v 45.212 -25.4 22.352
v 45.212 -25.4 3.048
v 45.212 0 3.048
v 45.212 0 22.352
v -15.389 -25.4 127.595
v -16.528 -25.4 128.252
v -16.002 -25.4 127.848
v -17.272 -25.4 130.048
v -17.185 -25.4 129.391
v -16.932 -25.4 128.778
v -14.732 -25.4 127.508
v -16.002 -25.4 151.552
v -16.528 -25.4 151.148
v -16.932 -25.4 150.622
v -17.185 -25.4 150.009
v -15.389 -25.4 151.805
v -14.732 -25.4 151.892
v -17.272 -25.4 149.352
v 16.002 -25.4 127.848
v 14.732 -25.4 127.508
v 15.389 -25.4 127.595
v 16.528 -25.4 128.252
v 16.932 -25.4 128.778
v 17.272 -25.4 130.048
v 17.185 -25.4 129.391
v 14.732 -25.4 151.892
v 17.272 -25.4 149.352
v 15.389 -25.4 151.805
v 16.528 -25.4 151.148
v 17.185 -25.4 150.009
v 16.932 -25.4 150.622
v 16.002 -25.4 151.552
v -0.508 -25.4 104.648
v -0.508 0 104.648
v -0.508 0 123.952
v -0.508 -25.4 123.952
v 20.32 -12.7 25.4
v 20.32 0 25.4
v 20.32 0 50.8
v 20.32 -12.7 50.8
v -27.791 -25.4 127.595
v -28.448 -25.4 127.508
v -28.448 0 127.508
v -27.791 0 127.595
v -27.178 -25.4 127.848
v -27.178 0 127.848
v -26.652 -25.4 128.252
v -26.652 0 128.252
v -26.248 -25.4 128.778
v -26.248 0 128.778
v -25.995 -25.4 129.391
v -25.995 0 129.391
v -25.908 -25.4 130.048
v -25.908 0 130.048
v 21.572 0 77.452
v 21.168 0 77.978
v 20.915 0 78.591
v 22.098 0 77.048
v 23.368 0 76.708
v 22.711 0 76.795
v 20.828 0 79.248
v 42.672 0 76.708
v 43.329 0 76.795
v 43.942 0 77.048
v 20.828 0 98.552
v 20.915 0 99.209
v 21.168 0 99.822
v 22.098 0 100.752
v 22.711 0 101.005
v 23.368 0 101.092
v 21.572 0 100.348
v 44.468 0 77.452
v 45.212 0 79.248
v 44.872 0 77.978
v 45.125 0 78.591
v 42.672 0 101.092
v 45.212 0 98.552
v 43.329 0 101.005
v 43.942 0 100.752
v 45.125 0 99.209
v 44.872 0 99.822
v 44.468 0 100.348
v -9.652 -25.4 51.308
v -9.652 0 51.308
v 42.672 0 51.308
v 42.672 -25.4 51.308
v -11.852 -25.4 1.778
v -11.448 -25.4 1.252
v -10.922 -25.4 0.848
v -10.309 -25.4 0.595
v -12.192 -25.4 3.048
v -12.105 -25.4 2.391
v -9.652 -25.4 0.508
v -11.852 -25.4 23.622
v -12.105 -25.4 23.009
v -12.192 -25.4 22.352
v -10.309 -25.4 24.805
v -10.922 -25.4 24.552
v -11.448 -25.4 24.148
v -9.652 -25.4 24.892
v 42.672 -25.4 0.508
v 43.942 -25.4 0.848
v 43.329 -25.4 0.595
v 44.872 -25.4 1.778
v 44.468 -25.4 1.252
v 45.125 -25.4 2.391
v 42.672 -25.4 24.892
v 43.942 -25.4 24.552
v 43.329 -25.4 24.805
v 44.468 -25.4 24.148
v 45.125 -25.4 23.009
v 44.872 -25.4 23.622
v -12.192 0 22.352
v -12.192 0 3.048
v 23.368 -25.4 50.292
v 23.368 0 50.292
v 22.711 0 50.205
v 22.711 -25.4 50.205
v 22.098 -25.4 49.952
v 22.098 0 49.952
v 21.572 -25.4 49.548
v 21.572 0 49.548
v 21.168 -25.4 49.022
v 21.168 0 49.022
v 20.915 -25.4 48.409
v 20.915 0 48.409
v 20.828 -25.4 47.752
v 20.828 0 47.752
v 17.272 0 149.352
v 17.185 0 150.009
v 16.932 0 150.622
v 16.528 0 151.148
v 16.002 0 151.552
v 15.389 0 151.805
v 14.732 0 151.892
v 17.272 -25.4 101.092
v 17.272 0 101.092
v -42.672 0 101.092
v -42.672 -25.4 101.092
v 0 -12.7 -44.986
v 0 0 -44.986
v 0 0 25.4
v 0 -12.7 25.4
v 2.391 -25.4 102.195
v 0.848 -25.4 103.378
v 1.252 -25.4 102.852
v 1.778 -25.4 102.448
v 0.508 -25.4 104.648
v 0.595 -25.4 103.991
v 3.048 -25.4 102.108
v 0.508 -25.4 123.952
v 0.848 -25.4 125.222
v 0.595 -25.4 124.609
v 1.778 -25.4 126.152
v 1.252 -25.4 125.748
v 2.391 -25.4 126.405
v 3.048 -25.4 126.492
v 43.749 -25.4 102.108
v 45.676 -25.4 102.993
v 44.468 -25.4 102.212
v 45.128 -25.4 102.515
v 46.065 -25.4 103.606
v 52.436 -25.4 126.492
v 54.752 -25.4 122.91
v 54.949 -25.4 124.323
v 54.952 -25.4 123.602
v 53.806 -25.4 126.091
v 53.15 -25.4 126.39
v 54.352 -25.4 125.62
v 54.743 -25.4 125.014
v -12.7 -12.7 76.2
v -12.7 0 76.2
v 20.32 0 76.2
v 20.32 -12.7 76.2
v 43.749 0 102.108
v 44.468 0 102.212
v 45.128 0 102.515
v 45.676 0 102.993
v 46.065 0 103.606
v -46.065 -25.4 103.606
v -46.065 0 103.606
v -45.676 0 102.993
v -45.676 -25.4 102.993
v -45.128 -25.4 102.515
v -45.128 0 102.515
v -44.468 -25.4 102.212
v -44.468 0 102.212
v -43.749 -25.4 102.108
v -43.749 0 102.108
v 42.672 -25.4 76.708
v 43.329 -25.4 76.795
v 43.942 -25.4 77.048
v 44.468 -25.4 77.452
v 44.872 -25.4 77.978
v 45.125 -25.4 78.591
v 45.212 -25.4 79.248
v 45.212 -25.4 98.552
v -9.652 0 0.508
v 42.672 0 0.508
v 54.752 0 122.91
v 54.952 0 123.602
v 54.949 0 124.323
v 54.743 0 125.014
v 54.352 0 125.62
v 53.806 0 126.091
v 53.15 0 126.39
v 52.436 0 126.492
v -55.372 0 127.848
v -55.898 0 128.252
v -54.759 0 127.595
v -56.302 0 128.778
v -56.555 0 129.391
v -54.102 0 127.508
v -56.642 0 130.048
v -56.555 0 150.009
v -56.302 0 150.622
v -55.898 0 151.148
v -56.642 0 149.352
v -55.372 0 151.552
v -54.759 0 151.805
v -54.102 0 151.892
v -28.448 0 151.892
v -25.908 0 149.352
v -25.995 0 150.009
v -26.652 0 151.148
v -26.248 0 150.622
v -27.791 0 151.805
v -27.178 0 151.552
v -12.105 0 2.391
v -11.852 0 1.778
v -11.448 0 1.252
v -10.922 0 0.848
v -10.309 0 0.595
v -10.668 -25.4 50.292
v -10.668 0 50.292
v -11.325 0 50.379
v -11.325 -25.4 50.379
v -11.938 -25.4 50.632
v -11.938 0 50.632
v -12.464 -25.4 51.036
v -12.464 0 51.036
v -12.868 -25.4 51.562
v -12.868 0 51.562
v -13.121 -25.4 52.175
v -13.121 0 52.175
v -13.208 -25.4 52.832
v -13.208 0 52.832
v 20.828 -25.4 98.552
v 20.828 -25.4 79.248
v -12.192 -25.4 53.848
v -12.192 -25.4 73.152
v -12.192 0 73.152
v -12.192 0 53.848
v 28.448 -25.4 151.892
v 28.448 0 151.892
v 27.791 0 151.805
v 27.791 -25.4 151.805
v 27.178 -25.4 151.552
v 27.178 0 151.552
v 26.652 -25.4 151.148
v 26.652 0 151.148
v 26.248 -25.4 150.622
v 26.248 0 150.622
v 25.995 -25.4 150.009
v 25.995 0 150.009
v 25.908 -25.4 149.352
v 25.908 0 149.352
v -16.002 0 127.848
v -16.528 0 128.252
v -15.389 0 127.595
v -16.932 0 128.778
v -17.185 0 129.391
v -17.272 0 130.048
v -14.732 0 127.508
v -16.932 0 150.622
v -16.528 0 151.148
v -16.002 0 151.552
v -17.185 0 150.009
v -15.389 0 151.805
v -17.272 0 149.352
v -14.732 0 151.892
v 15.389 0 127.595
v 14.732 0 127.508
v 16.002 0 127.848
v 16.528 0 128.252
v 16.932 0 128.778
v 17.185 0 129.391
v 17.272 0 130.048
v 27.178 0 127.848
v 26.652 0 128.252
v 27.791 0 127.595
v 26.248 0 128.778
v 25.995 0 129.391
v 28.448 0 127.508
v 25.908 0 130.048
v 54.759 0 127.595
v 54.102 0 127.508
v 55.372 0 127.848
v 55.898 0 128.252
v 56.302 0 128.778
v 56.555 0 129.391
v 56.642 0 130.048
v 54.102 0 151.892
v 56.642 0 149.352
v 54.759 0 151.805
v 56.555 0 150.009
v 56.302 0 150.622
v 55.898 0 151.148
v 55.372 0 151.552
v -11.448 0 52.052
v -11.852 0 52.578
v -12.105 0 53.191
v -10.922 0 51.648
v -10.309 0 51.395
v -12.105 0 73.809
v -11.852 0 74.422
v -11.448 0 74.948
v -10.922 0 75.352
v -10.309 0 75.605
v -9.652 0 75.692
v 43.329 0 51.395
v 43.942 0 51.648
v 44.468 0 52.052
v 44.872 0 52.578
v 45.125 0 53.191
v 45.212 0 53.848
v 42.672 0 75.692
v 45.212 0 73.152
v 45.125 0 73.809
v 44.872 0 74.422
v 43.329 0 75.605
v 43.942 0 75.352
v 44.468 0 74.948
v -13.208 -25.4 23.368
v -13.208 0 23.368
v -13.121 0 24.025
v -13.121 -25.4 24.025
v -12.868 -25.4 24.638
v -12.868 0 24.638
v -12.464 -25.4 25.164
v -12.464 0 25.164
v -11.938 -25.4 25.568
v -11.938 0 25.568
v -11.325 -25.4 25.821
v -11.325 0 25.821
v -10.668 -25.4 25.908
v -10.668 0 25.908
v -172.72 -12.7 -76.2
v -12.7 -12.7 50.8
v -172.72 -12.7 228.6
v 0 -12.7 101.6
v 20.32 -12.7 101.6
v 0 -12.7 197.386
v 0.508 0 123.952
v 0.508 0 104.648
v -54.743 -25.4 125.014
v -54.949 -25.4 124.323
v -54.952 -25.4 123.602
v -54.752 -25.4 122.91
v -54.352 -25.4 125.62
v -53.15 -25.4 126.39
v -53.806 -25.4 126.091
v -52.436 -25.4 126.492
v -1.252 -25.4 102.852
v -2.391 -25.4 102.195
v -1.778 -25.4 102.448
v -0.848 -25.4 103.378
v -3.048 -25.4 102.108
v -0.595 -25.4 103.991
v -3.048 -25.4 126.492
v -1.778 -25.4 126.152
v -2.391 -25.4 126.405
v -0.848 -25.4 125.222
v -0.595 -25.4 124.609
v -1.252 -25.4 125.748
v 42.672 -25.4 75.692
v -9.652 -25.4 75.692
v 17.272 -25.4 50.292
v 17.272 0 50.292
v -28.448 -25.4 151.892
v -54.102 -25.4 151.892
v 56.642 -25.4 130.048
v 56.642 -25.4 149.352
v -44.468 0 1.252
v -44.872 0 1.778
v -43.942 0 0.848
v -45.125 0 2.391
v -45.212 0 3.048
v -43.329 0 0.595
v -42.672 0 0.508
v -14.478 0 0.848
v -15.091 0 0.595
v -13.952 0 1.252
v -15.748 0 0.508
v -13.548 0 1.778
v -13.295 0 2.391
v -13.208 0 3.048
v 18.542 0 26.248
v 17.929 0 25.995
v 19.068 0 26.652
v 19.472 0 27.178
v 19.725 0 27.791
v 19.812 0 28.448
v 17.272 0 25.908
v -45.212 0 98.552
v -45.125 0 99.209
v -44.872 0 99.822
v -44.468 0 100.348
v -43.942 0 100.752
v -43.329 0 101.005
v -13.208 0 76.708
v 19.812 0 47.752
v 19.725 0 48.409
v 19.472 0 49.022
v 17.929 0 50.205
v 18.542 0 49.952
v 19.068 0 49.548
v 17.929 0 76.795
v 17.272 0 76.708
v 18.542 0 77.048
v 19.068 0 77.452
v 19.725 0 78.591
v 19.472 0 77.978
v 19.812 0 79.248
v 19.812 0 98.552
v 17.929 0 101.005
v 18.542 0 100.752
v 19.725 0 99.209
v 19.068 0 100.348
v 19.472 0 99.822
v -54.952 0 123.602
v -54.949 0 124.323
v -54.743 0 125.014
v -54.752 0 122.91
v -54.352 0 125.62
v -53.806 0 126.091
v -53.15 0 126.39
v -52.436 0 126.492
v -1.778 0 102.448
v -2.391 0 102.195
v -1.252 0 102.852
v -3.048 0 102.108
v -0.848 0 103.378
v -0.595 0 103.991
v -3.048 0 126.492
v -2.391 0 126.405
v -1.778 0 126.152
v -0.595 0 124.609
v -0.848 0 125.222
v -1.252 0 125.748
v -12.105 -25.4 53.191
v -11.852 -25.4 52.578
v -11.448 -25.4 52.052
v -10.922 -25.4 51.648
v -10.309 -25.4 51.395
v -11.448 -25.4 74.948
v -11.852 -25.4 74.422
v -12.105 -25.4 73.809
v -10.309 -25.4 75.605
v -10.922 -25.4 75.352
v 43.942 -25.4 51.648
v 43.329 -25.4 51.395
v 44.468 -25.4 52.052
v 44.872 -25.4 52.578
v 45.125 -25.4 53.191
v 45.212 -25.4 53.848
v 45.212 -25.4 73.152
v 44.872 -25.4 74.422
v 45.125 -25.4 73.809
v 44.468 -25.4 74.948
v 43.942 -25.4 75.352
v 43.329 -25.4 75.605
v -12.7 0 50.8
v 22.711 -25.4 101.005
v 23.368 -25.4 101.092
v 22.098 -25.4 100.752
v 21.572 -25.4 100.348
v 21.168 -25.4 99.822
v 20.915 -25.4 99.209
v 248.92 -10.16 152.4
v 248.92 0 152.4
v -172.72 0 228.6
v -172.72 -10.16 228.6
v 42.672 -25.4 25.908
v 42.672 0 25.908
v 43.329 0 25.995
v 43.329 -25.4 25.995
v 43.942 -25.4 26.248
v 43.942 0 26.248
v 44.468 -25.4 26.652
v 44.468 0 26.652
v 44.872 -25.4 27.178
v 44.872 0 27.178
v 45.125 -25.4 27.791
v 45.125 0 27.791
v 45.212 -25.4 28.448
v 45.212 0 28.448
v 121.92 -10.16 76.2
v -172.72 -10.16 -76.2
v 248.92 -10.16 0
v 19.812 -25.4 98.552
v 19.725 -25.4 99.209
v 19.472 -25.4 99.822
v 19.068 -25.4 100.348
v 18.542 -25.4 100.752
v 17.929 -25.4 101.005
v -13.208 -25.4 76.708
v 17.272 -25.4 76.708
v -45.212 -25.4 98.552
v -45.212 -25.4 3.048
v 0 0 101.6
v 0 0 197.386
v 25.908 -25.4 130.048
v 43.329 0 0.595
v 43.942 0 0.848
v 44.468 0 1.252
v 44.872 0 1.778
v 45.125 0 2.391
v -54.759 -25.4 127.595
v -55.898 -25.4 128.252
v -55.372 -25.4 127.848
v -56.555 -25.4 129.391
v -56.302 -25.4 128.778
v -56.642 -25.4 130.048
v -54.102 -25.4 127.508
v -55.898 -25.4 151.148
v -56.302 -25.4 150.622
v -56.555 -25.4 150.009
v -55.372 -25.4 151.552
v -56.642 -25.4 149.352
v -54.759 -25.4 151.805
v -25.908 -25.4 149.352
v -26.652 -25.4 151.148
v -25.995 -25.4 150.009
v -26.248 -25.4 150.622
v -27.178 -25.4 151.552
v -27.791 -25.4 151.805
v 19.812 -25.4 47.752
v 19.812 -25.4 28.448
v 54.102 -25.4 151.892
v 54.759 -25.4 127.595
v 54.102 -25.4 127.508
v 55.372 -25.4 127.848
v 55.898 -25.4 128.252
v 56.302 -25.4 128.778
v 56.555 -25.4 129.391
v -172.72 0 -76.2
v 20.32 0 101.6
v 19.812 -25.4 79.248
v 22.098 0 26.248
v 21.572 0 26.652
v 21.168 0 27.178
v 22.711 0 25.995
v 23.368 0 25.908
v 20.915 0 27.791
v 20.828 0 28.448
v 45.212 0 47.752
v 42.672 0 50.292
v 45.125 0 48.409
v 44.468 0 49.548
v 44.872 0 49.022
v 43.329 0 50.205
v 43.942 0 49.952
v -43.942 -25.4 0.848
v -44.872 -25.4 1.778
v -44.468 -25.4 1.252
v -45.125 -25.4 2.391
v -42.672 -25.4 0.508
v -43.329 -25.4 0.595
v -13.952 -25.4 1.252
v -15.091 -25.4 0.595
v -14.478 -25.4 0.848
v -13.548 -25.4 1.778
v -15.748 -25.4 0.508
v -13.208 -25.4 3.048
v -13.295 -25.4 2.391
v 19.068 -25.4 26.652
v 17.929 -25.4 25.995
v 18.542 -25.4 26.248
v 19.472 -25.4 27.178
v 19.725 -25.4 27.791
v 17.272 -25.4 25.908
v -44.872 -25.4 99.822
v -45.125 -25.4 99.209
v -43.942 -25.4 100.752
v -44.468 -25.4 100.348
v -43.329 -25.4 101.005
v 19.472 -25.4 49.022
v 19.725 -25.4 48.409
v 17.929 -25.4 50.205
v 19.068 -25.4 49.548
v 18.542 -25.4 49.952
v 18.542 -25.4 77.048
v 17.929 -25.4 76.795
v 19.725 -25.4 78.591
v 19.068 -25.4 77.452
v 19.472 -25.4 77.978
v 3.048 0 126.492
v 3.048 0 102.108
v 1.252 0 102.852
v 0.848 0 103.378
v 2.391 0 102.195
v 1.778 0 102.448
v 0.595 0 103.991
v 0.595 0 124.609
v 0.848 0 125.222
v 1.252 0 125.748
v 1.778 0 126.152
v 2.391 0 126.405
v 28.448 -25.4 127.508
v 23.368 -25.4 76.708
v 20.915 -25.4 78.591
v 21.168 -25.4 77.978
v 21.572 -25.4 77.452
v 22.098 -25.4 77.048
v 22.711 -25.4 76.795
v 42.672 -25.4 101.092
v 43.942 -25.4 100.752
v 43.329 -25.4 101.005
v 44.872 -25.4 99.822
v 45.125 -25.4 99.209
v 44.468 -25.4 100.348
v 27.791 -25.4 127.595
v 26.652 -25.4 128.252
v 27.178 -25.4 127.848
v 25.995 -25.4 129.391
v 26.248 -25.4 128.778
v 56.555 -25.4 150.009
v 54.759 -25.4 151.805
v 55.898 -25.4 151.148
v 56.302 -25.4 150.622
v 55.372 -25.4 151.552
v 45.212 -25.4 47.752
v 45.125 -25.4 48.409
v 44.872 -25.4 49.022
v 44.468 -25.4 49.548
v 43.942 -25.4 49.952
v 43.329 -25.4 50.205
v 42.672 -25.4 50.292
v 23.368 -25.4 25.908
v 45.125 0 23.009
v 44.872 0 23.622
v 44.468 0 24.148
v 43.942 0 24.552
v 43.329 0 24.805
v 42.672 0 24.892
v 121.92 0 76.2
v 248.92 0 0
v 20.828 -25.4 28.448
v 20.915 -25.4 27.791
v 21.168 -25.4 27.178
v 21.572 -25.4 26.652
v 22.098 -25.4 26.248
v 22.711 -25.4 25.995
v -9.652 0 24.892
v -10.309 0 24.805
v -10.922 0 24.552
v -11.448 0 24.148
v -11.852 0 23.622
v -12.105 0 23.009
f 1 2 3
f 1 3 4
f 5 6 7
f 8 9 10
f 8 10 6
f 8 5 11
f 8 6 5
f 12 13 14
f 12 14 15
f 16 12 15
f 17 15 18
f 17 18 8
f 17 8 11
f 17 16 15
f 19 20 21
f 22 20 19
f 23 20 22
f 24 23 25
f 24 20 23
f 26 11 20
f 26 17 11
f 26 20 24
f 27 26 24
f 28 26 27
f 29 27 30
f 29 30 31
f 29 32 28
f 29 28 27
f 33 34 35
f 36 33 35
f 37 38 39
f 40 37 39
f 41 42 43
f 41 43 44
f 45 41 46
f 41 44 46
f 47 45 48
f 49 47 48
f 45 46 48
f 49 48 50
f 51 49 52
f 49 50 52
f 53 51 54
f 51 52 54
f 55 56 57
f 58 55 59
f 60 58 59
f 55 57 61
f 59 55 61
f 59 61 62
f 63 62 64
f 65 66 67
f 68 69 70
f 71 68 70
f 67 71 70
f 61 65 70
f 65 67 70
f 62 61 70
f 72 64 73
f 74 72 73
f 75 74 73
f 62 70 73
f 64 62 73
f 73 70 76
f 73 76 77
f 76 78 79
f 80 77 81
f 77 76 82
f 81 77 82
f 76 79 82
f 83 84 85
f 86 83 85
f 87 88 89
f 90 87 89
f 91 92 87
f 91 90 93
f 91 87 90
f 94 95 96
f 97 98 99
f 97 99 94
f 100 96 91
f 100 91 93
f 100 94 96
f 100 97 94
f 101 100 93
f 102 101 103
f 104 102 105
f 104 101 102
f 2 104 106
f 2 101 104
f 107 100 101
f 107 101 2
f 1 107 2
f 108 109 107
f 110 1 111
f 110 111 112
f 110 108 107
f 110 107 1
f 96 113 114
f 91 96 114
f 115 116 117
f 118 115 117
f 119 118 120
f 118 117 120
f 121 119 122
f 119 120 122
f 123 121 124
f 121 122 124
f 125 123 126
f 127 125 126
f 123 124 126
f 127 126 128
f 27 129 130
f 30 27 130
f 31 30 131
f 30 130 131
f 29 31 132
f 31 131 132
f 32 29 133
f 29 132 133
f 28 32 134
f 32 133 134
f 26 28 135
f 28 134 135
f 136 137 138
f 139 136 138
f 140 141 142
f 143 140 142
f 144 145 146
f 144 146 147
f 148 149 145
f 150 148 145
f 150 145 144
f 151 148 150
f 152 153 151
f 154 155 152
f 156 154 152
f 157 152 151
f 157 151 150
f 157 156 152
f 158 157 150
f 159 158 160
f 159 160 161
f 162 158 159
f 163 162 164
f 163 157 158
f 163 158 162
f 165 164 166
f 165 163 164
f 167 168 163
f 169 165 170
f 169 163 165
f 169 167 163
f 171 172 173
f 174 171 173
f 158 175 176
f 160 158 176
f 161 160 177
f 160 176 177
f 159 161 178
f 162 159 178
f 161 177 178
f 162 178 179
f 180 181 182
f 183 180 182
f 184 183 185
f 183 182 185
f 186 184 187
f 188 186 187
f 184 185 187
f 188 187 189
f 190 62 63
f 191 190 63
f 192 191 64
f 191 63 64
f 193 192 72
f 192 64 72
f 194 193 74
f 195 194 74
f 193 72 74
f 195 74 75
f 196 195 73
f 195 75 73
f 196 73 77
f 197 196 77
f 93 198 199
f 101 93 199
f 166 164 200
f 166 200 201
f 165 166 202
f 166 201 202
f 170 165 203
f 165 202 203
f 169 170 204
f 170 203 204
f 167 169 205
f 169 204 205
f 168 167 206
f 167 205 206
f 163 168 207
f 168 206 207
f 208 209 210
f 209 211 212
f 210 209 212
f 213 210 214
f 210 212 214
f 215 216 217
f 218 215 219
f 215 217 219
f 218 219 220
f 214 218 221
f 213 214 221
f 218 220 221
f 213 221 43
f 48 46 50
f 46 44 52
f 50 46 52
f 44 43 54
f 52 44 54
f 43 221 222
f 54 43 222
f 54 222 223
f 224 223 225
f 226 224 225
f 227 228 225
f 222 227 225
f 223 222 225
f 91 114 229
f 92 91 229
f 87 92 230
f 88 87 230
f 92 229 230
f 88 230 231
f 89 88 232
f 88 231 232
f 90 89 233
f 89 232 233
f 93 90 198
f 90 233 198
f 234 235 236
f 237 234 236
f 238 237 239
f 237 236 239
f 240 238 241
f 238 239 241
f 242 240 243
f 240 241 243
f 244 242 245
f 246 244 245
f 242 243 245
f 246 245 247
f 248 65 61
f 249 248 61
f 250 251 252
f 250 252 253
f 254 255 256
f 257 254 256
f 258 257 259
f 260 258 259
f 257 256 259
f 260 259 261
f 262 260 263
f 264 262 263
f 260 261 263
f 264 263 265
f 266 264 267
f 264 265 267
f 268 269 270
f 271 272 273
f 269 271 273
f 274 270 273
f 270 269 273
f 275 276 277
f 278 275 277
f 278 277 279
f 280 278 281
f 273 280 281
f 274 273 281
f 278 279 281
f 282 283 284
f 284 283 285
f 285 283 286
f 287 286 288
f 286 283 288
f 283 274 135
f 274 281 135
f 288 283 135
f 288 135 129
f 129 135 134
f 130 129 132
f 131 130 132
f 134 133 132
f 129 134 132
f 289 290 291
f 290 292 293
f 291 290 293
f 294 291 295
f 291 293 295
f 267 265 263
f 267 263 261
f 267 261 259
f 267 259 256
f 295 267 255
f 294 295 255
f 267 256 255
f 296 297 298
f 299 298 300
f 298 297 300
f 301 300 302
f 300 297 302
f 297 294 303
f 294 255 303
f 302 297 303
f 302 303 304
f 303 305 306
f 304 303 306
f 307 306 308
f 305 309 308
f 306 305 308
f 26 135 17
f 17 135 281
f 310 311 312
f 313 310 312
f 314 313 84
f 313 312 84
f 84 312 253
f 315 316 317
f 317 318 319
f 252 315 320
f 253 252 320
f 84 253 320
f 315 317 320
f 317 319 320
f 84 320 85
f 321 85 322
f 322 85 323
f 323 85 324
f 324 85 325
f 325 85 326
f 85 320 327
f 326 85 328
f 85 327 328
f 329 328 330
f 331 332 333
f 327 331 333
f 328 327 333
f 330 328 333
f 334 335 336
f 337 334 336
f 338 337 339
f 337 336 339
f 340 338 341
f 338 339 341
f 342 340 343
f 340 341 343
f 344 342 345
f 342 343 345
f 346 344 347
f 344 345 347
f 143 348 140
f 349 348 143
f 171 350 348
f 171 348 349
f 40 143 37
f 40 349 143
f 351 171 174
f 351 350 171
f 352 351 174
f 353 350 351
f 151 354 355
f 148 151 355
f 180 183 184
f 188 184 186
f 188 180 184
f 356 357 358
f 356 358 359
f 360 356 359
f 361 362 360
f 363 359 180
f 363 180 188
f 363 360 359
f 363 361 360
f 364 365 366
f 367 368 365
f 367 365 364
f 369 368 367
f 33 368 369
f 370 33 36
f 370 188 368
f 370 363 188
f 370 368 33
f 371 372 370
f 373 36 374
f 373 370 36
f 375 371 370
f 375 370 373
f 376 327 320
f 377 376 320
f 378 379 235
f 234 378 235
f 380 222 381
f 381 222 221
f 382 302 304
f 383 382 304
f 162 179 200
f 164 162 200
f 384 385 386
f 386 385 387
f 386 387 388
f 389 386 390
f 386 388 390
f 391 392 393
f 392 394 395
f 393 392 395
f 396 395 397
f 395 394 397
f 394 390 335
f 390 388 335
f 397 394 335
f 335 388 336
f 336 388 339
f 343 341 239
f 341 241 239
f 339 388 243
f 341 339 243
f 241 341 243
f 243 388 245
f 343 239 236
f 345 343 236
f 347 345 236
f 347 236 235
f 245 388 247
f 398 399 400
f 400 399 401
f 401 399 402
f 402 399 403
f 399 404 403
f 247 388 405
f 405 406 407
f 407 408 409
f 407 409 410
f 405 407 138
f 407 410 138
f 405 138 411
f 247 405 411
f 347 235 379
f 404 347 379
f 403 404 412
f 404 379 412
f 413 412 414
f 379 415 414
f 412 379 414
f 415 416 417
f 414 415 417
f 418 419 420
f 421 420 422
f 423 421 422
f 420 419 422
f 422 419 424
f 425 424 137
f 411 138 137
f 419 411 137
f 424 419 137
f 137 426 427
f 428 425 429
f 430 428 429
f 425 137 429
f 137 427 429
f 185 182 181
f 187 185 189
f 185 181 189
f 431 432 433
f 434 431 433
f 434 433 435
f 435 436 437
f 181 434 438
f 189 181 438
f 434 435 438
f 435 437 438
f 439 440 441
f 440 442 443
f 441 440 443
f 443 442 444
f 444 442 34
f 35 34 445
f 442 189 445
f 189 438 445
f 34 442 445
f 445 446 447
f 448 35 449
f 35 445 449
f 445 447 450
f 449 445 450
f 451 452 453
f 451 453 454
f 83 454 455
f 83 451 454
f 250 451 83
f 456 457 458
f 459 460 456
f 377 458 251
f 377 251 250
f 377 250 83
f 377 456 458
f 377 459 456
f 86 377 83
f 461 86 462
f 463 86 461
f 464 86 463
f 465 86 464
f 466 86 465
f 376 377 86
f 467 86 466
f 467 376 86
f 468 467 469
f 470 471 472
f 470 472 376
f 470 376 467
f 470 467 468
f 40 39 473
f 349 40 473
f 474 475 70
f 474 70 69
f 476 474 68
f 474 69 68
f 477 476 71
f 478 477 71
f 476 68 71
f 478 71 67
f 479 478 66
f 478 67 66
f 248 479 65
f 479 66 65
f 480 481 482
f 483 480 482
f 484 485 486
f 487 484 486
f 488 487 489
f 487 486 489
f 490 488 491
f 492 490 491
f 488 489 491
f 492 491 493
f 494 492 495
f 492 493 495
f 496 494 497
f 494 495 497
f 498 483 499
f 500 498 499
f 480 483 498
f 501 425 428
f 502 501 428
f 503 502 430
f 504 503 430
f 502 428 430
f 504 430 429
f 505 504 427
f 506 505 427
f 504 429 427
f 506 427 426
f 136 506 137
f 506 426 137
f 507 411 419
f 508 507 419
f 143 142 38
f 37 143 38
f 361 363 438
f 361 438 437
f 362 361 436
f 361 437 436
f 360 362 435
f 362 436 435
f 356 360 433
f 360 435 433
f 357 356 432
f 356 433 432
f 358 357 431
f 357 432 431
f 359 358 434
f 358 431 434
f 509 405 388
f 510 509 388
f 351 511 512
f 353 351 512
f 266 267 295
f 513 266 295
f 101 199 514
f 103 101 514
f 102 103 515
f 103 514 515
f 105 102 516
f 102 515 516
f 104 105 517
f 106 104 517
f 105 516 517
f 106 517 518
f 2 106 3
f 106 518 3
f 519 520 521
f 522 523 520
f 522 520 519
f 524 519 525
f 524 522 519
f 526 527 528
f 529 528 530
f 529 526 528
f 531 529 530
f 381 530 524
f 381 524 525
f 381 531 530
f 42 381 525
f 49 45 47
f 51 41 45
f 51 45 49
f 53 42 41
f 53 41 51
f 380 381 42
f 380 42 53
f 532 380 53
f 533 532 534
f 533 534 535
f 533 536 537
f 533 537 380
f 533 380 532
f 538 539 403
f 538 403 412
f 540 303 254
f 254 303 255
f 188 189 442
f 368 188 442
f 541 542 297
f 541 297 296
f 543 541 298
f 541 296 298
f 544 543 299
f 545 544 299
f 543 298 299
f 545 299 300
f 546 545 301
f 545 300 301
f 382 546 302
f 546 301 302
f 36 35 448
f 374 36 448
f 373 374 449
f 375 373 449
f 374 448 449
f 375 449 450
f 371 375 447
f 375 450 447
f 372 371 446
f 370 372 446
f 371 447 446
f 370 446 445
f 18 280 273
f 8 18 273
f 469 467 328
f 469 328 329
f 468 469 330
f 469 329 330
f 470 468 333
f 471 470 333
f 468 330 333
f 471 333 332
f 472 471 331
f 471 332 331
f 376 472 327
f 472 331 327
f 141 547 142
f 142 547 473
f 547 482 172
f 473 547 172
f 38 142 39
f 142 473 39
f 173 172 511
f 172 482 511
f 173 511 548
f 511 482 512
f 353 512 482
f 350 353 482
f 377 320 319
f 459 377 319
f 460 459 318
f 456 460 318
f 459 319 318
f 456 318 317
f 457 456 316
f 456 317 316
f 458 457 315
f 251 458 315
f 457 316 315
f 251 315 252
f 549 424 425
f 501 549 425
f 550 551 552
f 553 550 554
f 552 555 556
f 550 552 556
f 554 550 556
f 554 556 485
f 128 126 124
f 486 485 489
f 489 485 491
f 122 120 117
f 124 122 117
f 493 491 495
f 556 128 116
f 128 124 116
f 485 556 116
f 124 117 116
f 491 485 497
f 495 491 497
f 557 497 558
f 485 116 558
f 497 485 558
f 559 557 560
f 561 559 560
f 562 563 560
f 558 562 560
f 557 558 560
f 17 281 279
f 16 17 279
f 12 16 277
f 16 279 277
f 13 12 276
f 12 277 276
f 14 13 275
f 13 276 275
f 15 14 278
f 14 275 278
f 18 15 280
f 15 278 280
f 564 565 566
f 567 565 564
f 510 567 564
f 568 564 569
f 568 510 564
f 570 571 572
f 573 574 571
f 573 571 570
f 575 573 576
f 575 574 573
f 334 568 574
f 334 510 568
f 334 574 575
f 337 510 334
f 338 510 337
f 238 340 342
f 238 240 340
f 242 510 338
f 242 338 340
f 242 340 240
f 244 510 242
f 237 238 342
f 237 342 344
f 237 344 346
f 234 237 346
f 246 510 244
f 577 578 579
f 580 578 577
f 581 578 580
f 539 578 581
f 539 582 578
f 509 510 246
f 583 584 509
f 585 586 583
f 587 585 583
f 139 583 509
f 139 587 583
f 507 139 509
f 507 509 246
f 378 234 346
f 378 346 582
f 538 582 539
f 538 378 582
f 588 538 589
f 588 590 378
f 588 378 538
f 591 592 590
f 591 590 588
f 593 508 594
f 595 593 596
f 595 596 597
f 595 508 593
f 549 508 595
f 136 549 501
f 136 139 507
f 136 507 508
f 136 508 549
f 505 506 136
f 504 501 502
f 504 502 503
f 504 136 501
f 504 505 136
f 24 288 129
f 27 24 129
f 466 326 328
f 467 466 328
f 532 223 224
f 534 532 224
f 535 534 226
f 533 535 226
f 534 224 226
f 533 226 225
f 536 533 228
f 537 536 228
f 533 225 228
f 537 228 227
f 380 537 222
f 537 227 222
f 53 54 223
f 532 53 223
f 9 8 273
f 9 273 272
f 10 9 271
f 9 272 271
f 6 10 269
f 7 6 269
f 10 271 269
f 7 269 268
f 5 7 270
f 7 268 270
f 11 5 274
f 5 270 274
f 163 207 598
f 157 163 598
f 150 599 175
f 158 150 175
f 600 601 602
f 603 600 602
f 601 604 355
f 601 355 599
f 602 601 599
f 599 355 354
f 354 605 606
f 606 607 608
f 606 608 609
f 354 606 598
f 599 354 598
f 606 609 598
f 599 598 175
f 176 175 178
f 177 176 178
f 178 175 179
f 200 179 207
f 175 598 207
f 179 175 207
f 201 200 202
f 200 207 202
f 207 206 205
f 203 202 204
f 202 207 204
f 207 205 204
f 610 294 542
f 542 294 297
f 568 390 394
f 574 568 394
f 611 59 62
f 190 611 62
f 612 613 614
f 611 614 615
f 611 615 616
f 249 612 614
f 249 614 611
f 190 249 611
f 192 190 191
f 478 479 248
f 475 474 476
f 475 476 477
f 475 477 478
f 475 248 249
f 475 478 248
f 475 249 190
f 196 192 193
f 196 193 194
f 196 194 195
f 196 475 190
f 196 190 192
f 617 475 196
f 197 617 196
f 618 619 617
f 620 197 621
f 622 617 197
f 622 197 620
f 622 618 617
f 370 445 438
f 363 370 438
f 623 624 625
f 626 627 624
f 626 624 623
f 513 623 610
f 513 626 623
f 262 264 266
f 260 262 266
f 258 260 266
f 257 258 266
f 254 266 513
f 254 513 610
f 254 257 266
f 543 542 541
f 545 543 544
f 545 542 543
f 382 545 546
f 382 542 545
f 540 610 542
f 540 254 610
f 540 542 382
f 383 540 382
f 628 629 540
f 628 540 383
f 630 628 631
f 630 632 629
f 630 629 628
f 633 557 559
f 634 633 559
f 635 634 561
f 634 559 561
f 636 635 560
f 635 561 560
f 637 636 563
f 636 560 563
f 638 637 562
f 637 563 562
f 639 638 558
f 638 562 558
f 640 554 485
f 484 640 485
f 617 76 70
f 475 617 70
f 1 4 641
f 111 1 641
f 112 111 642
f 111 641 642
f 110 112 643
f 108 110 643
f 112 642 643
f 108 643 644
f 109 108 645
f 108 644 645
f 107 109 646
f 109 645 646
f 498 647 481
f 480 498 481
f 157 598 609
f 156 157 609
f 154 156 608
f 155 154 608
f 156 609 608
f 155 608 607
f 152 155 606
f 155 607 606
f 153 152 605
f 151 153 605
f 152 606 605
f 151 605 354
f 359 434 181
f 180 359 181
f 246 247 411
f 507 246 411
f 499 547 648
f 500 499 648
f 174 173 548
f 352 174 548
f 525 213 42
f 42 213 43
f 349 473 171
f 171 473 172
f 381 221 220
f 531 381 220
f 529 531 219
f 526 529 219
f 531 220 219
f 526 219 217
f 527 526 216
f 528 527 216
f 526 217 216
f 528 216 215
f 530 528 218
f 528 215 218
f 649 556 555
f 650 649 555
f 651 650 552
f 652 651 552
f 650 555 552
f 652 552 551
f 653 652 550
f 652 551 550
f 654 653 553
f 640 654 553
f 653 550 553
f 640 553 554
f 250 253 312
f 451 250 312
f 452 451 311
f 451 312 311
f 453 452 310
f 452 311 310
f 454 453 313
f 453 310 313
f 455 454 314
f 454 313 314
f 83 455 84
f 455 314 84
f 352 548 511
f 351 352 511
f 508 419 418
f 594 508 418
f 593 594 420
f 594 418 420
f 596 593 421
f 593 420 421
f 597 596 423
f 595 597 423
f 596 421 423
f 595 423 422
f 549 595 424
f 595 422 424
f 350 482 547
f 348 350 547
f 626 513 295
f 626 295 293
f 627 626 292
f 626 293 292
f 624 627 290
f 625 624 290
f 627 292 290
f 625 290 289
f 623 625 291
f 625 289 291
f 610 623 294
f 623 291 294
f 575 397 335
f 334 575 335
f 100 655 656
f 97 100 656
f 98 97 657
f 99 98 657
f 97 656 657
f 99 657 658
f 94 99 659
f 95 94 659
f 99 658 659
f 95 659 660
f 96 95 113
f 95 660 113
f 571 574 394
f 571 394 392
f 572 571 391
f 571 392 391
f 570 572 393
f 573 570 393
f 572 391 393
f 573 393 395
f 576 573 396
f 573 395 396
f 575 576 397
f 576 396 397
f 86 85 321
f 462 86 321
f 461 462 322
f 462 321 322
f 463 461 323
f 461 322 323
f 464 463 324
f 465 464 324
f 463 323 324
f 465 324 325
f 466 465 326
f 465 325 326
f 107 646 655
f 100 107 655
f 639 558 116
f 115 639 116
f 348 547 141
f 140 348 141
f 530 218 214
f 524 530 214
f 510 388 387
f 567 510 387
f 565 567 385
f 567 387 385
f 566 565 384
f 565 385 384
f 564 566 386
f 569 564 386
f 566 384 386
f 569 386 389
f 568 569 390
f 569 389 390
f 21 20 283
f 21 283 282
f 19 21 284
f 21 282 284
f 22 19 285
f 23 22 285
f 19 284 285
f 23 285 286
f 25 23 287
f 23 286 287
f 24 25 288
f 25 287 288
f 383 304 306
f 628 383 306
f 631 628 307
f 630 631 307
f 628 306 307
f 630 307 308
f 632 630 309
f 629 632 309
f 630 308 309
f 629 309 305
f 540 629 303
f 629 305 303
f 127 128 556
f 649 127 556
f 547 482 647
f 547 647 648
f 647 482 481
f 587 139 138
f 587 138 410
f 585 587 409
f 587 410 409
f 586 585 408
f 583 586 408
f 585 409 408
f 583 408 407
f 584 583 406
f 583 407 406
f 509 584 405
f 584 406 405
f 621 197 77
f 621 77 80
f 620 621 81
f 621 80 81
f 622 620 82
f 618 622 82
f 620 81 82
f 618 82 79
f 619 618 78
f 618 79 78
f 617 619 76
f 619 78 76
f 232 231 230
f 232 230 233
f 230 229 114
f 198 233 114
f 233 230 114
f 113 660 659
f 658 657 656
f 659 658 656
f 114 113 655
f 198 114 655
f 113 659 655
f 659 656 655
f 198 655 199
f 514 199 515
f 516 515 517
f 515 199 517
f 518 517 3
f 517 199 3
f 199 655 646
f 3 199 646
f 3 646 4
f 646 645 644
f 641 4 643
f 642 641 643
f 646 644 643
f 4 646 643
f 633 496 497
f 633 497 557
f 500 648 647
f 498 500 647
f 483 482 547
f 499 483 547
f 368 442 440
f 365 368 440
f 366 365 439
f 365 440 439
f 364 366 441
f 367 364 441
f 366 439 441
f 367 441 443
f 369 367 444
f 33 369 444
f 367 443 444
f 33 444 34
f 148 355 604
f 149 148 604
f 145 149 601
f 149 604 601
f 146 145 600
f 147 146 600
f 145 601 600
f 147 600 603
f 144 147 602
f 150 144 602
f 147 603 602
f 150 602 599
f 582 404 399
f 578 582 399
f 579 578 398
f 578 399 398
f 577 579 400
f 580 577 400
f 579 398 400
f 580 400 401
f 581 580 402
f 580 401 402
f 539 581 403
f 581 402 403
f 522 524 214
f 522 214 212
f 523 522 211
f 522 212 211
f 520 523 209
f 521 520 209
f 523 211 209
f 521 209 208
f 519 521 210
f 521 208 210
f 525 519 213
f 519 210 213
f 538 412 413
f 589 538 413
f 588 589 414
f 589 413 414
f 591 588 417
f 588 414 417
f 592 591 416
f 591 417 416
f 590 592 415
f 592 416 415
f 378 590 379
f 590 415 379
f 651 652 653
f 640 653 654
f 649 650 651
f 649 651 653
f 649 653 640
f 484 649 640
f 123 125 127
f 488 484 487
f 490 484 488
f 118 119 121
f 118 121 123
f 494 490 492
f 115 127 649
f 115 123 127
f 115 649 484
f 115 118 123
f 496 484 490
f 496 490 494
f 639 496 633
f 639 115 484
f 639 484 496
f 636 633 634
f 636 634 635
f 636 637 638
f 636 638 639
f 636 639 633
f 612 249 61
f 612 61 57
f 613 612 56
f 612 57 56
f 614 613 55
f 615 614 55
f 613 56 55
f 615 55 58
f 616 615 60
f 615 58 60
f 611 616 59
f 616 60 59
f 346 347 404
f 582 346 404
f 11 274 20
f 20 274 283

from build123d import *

# Parameters (mm, degrees)
F2_DEPTH = 25.4
F5_DEPTH = 12.7
F6_DEPTH = 10.16


with BuildPart() as f2:
    # F1 (on face) → F2 (new body)
    with BuildSketch(Plane.XZ):
        with BuildLine():
            ThreePointArc((17.272, 76.708), (19.068051, 77.451949), (19.812, 79.248))
            Line((19.812, 79.248), (19.812, 98.552))
            ThreePointArc((19.812, 98.552), (19.068051, 100.348051), (17.272, 101.092))
            Line((17.272, 101.092), (0, 101.092))
            Line((0, 101.092), (-42.672, 101.092))
            ThreePointArc((-42.672, 101.092), (-44.468051, 100.348051), (-45.212, 98.552))
            Line((-45.212, 98.552), (-45.212, 76.2))
            Line((-45.212, 76.2), (-45.212, 50.8))
            Line((-45.212, 50.8), (-45.212, 25.4))
            Line((-45.212, 25.4), (-45.212, 3.048))
            ThreePointArc((-45.212, 3.048), (-44.468051, 1.251949), (-42.672, 0.508))
            Line((-42.672, 0.508), (-15.748, 0.508))
            ThreePointArc((-15.748, 0.508), (-13.951949, 1.251949), (-13.208, 3.048))
            Line((-13.208, 3.048), (-13.208, 23.368))
            ThreePointArc((-13.208, 23.368), (-12.464051, 25.164051), (-10.668, 25.908))
            Line((-10.668, 25.908), (17.272, 25.908))
            ThreePointArc((17.272, 25.908), (19.068051, 26.651949), (19.812, 28.448))
            Line((19.812, 28.448), (19.812, 47.752))
            ThreePointArc((19.812, 47.752), (19.068051, 49.548051), (17.272, 50.292))
            Line((17.272, 50.292), (-10.668, 50.292))
            ThreePointArc((-10.668, 50.292), (-12.464051, 51.035949), (-13.208, 52.832))
            Line((-13.208, 52.832), (-13.208, 76.708))
            Line((-13.208, 76.708), (17.272, 76.708))
        make_face()
        with BuildLine():
            Line((42.672, 24.892), (15.24, 24.892))
            Line((15.24, 24.892), (-9.652, 24.892))
            ThreePointArc((-9.652, 24.892), (-11.448051, 24.148051), (-12.192, 22.352))
            Line((-12.192, 22.352), (-12.192, 3.048))
            ThreePointArc((-12.192, 3.048), (-11.448051, 1.251949), (-9.652, 0.508))
            Line((-9.652, 0.508), (42.672, 0.508))
            ThreePointArc((42.672, 0.508), (44.468051, 1.251949), (45.212, 3.048))
            Line((45.212, 3.048), (45.212, 22.352))
            ThreePointArc((45.212, 22.352), (44.468051, 24.148051), (42.672, 24.892))
        make_face()
        with BuildLine():
            ThreePointArc((45.212, 47.752), (44.468051, 49.548051), (42.672, 50.292))
            Line((42.672, 50.292), (23.368, 50.292))
            ThreePointArc((23.368, 50.292), (21.571949, 49.548051), (20.828, 47.752))
            Line((20.828, 47.752), (20.828, 28.448))
            ThreePointArc((20.828, 28.448), (21.571949, 26.651949), (23.368, 25.908))
            Line((23.368, 25.908), (42.672, 25.908))
            ThreePointArc((42.672, 25.908), (44.468051, 26.651949), (45.212, 28.448))
            Line((45.212, 28.448), (45.212, 47.752))
        make_face()
        with BuildLine():
            ThreePointArc((42.672, 51.308), (44.468051, 52.051949), (45.212, 53.848))
            Line((45.212, 53.848), (45.212, 73.152))
            ThreePointArc((45.212, 73.152), (44.468051, 74.948051), (42.672, 75.692))
            Line((42.672, 75.692), (25.4, 75.692))
            Line((25.4, 75.692), (-9.652, 75.692))
            ThreePointArc((-9.652, 75.692), (-11.448051, 74.948051), (-12.192, 73.152))
            Line((-12.192, 73.152), (-12.192, 53.848))
            ThreePointArc((-12.192, 53.848), (-11.448051, 52.051949), (-9.652, 51.308))
            Line((-9.652, 51.308), (15.24, 51.308))
            Line((15.24, 51.308), (42.672, 51.308))
        make_face()
        with BuildLine():
            ThreePointArc((45.212, 98.552), (44.468051, 100.348051), (42.672, 101.092))
            Line((42.672, 101.092), (23.368, 101.092))
            ThreePointArc((23.368, 101.092), (21.571949, 100.348051), (20.828, 98.552))
            Line((20.828, 98.552), (20.828, 79.248))
            ThreePointArc((20.828, 79.248), (21.571949, 77.451949), (23.368, 76.708))
            Line((23.368, 76.708), (42.672, 76.708))
            ThreePointArc((42.672, 76.708), (44.468051, 77.451949), (45.212, 79.248))
            Line((45.212, 79.248), (45.212, 98.552))
        make_face()
        with BuildLine():
            ThreePointArc((43.749207, 102.108), (45.128354, 102.515032), (46.065488, 103.605674))
            Line((46.065488, 103.605674), (54.752288, 122.909674))
            ThreePointArc((54.752288, 122.909674), (54.568976, 125.331147), (52.436007, 126.492))
            Line((52.436007, 126.492), (25.4, 126.492))
            Line((25.4, 126.492), (15.24, 126.492))
            Line((15.24, 126.492), (3.048, 126.492))
            ThreePointArc((3.048, 126.492), (1.251949, 125.748051), (0.508, 123.952))
            Line((0.508, 123.952), (0.508, 104.648))
            ThreePointArc((0.508, 104.648), (1.251949, 102.851949), (3.048, 102.108))
            Line((3.048, 102.108), (25.4, 102.108))
            Line((25.4, 102.108), (43.749207, 102.108))
        make_face()
        with BuildLine():
            ThreePointArc((-3.048, 102.108), (-1.251949, 102.851949), (-0.508, 104.648))
            Line((-0.508, 104.648), (-0.508, 123.952))
            ThreePointArc((-0.508, 123.952), (-1.251949, 125.748051), (-3.048, 126.492))
            Line((-3.048, 126.492), (-15.24, 126.492))
            Line((-15.24, 126.492), (-25.4, 126.492))
            Line((-25.4, 126.492), (-52.436007, 126.492))
            ThreePointArc((-52.436007, 126.492), (-54.568976, 125.331147), (-54.752288, 122.909674))
            Line((-54.752288, 122.909674), (-46.065488, 103.605674))
            ThreePointArc((-46.065488, 103.605674), (-45.128354, 102.515032), (-43.749207, 102.108))
            Line((-43.749207, 102.108), (-3.048, 102.108))
        make_face()
        with BuildLine():
            ThreePointArc((-54.102, 151.892), (-55.898051, 151.148051), (-56.642, 149.352))
            Line((-56.642, 149.352), (-56.642, 130.048))
            ThreePointArc((-56.642, 130.048), (-55.898051, 128.251949), (-54.102, 127.508))
            Line((-54.102, 127.508), (-28.448, 127.508))
            ThreePointArc((-28.448, 127.508), (-26.651949, 128.251949), (-25.908, 130.048))
            Line((-25.908, 130.048), (-25.908, 149.352))
            ThreePointArc((-25.908, 149.352), (-26.651949, 151.148051), (-28.448, 151.892))
            Line((-28.448, 151.892), (-54.102, 151.892))
        make_face()
        with BuildLine():
            ThreePointArc((-17.272, 130.048), (-16.528051, 128.251949), (-14.732, 127.508))
            Line((-14.732, 127.508), (0, 127.508))
            Line((0, 127.508), (14.732, 127.508))
            ThreePointArc((14.732, 127.508), (16.528051, 128.251949), (17.272, 130.048))
            Line((17.272, 130.048), (17.272, 149.352))
            ThreePointArc((17.272, 149.352), (16.528051, 151.148051), (14.732, 151.892))
            Line((14.732, 151.892), (-14.732, 151.892))
            ThreePointArc((-14.732, 151.892), (-16.528051, 151.148051), (-17.272, 149.352))
            Line((-17.272, 149.352), (-17.272, 130.048))
        make_face()
        with BuildLine():
            ThreePointArc((28.448, 151.892), (26.651949, 151.148051), (25.908, 149.352))
            Line((25.908, 149.352), (25.908, 130.048))
            ThreePointArc((25.908, 130.048), (26.651949, 128.251949), (28.448, 127.508))
            Line((28.448, 127.508), (54.102, 127.508))
            ThreePointArc((54.102, 127.508), (55.898051, 128.251949), (56.642, 130.048))
            Line((56.642, 130.048), (56.642, 149.352))
            ThreePointArc((56.642, 149.352), (55.898051, 151.148051), (54.102, 151.892))
            Line((54.102, 151.892), (28.448, 151.892))
        make_face()
    extrude(amount=F2_DEPTH)


with BuildPart() as f5:
    # F4 (on face) → F5 (new body)
    with BuildSketch(Plane.XZ):
        Polygon((0, 197.385542), (-172.72, 228.6), (-172.72, -76.2), (0, -44.985542), (0, 25.4), (20.32, 25.4), (20.32, 50.8), (-12.7, 50.8), (-12.7, 76.2), (20.32, 76.2), (20.32, 101.6), (0, 101.6), (0, 127), align=None)
    extrude(amount=F5_DEPTH)


with BuildPart() as f6:
    # F3 (on Front) → F6 (new body)
    with BuildSketch(Plane.XZ):
        Polygon((248.92, 152.4), (-172.72, 228.6), (-172.72, -76.2), (248.92, 0), (121.92, 76.2), align=None)
    extrude(amount=F6_DEPTH)


solid = Compound([f2.part, f5.part, f6.part])
